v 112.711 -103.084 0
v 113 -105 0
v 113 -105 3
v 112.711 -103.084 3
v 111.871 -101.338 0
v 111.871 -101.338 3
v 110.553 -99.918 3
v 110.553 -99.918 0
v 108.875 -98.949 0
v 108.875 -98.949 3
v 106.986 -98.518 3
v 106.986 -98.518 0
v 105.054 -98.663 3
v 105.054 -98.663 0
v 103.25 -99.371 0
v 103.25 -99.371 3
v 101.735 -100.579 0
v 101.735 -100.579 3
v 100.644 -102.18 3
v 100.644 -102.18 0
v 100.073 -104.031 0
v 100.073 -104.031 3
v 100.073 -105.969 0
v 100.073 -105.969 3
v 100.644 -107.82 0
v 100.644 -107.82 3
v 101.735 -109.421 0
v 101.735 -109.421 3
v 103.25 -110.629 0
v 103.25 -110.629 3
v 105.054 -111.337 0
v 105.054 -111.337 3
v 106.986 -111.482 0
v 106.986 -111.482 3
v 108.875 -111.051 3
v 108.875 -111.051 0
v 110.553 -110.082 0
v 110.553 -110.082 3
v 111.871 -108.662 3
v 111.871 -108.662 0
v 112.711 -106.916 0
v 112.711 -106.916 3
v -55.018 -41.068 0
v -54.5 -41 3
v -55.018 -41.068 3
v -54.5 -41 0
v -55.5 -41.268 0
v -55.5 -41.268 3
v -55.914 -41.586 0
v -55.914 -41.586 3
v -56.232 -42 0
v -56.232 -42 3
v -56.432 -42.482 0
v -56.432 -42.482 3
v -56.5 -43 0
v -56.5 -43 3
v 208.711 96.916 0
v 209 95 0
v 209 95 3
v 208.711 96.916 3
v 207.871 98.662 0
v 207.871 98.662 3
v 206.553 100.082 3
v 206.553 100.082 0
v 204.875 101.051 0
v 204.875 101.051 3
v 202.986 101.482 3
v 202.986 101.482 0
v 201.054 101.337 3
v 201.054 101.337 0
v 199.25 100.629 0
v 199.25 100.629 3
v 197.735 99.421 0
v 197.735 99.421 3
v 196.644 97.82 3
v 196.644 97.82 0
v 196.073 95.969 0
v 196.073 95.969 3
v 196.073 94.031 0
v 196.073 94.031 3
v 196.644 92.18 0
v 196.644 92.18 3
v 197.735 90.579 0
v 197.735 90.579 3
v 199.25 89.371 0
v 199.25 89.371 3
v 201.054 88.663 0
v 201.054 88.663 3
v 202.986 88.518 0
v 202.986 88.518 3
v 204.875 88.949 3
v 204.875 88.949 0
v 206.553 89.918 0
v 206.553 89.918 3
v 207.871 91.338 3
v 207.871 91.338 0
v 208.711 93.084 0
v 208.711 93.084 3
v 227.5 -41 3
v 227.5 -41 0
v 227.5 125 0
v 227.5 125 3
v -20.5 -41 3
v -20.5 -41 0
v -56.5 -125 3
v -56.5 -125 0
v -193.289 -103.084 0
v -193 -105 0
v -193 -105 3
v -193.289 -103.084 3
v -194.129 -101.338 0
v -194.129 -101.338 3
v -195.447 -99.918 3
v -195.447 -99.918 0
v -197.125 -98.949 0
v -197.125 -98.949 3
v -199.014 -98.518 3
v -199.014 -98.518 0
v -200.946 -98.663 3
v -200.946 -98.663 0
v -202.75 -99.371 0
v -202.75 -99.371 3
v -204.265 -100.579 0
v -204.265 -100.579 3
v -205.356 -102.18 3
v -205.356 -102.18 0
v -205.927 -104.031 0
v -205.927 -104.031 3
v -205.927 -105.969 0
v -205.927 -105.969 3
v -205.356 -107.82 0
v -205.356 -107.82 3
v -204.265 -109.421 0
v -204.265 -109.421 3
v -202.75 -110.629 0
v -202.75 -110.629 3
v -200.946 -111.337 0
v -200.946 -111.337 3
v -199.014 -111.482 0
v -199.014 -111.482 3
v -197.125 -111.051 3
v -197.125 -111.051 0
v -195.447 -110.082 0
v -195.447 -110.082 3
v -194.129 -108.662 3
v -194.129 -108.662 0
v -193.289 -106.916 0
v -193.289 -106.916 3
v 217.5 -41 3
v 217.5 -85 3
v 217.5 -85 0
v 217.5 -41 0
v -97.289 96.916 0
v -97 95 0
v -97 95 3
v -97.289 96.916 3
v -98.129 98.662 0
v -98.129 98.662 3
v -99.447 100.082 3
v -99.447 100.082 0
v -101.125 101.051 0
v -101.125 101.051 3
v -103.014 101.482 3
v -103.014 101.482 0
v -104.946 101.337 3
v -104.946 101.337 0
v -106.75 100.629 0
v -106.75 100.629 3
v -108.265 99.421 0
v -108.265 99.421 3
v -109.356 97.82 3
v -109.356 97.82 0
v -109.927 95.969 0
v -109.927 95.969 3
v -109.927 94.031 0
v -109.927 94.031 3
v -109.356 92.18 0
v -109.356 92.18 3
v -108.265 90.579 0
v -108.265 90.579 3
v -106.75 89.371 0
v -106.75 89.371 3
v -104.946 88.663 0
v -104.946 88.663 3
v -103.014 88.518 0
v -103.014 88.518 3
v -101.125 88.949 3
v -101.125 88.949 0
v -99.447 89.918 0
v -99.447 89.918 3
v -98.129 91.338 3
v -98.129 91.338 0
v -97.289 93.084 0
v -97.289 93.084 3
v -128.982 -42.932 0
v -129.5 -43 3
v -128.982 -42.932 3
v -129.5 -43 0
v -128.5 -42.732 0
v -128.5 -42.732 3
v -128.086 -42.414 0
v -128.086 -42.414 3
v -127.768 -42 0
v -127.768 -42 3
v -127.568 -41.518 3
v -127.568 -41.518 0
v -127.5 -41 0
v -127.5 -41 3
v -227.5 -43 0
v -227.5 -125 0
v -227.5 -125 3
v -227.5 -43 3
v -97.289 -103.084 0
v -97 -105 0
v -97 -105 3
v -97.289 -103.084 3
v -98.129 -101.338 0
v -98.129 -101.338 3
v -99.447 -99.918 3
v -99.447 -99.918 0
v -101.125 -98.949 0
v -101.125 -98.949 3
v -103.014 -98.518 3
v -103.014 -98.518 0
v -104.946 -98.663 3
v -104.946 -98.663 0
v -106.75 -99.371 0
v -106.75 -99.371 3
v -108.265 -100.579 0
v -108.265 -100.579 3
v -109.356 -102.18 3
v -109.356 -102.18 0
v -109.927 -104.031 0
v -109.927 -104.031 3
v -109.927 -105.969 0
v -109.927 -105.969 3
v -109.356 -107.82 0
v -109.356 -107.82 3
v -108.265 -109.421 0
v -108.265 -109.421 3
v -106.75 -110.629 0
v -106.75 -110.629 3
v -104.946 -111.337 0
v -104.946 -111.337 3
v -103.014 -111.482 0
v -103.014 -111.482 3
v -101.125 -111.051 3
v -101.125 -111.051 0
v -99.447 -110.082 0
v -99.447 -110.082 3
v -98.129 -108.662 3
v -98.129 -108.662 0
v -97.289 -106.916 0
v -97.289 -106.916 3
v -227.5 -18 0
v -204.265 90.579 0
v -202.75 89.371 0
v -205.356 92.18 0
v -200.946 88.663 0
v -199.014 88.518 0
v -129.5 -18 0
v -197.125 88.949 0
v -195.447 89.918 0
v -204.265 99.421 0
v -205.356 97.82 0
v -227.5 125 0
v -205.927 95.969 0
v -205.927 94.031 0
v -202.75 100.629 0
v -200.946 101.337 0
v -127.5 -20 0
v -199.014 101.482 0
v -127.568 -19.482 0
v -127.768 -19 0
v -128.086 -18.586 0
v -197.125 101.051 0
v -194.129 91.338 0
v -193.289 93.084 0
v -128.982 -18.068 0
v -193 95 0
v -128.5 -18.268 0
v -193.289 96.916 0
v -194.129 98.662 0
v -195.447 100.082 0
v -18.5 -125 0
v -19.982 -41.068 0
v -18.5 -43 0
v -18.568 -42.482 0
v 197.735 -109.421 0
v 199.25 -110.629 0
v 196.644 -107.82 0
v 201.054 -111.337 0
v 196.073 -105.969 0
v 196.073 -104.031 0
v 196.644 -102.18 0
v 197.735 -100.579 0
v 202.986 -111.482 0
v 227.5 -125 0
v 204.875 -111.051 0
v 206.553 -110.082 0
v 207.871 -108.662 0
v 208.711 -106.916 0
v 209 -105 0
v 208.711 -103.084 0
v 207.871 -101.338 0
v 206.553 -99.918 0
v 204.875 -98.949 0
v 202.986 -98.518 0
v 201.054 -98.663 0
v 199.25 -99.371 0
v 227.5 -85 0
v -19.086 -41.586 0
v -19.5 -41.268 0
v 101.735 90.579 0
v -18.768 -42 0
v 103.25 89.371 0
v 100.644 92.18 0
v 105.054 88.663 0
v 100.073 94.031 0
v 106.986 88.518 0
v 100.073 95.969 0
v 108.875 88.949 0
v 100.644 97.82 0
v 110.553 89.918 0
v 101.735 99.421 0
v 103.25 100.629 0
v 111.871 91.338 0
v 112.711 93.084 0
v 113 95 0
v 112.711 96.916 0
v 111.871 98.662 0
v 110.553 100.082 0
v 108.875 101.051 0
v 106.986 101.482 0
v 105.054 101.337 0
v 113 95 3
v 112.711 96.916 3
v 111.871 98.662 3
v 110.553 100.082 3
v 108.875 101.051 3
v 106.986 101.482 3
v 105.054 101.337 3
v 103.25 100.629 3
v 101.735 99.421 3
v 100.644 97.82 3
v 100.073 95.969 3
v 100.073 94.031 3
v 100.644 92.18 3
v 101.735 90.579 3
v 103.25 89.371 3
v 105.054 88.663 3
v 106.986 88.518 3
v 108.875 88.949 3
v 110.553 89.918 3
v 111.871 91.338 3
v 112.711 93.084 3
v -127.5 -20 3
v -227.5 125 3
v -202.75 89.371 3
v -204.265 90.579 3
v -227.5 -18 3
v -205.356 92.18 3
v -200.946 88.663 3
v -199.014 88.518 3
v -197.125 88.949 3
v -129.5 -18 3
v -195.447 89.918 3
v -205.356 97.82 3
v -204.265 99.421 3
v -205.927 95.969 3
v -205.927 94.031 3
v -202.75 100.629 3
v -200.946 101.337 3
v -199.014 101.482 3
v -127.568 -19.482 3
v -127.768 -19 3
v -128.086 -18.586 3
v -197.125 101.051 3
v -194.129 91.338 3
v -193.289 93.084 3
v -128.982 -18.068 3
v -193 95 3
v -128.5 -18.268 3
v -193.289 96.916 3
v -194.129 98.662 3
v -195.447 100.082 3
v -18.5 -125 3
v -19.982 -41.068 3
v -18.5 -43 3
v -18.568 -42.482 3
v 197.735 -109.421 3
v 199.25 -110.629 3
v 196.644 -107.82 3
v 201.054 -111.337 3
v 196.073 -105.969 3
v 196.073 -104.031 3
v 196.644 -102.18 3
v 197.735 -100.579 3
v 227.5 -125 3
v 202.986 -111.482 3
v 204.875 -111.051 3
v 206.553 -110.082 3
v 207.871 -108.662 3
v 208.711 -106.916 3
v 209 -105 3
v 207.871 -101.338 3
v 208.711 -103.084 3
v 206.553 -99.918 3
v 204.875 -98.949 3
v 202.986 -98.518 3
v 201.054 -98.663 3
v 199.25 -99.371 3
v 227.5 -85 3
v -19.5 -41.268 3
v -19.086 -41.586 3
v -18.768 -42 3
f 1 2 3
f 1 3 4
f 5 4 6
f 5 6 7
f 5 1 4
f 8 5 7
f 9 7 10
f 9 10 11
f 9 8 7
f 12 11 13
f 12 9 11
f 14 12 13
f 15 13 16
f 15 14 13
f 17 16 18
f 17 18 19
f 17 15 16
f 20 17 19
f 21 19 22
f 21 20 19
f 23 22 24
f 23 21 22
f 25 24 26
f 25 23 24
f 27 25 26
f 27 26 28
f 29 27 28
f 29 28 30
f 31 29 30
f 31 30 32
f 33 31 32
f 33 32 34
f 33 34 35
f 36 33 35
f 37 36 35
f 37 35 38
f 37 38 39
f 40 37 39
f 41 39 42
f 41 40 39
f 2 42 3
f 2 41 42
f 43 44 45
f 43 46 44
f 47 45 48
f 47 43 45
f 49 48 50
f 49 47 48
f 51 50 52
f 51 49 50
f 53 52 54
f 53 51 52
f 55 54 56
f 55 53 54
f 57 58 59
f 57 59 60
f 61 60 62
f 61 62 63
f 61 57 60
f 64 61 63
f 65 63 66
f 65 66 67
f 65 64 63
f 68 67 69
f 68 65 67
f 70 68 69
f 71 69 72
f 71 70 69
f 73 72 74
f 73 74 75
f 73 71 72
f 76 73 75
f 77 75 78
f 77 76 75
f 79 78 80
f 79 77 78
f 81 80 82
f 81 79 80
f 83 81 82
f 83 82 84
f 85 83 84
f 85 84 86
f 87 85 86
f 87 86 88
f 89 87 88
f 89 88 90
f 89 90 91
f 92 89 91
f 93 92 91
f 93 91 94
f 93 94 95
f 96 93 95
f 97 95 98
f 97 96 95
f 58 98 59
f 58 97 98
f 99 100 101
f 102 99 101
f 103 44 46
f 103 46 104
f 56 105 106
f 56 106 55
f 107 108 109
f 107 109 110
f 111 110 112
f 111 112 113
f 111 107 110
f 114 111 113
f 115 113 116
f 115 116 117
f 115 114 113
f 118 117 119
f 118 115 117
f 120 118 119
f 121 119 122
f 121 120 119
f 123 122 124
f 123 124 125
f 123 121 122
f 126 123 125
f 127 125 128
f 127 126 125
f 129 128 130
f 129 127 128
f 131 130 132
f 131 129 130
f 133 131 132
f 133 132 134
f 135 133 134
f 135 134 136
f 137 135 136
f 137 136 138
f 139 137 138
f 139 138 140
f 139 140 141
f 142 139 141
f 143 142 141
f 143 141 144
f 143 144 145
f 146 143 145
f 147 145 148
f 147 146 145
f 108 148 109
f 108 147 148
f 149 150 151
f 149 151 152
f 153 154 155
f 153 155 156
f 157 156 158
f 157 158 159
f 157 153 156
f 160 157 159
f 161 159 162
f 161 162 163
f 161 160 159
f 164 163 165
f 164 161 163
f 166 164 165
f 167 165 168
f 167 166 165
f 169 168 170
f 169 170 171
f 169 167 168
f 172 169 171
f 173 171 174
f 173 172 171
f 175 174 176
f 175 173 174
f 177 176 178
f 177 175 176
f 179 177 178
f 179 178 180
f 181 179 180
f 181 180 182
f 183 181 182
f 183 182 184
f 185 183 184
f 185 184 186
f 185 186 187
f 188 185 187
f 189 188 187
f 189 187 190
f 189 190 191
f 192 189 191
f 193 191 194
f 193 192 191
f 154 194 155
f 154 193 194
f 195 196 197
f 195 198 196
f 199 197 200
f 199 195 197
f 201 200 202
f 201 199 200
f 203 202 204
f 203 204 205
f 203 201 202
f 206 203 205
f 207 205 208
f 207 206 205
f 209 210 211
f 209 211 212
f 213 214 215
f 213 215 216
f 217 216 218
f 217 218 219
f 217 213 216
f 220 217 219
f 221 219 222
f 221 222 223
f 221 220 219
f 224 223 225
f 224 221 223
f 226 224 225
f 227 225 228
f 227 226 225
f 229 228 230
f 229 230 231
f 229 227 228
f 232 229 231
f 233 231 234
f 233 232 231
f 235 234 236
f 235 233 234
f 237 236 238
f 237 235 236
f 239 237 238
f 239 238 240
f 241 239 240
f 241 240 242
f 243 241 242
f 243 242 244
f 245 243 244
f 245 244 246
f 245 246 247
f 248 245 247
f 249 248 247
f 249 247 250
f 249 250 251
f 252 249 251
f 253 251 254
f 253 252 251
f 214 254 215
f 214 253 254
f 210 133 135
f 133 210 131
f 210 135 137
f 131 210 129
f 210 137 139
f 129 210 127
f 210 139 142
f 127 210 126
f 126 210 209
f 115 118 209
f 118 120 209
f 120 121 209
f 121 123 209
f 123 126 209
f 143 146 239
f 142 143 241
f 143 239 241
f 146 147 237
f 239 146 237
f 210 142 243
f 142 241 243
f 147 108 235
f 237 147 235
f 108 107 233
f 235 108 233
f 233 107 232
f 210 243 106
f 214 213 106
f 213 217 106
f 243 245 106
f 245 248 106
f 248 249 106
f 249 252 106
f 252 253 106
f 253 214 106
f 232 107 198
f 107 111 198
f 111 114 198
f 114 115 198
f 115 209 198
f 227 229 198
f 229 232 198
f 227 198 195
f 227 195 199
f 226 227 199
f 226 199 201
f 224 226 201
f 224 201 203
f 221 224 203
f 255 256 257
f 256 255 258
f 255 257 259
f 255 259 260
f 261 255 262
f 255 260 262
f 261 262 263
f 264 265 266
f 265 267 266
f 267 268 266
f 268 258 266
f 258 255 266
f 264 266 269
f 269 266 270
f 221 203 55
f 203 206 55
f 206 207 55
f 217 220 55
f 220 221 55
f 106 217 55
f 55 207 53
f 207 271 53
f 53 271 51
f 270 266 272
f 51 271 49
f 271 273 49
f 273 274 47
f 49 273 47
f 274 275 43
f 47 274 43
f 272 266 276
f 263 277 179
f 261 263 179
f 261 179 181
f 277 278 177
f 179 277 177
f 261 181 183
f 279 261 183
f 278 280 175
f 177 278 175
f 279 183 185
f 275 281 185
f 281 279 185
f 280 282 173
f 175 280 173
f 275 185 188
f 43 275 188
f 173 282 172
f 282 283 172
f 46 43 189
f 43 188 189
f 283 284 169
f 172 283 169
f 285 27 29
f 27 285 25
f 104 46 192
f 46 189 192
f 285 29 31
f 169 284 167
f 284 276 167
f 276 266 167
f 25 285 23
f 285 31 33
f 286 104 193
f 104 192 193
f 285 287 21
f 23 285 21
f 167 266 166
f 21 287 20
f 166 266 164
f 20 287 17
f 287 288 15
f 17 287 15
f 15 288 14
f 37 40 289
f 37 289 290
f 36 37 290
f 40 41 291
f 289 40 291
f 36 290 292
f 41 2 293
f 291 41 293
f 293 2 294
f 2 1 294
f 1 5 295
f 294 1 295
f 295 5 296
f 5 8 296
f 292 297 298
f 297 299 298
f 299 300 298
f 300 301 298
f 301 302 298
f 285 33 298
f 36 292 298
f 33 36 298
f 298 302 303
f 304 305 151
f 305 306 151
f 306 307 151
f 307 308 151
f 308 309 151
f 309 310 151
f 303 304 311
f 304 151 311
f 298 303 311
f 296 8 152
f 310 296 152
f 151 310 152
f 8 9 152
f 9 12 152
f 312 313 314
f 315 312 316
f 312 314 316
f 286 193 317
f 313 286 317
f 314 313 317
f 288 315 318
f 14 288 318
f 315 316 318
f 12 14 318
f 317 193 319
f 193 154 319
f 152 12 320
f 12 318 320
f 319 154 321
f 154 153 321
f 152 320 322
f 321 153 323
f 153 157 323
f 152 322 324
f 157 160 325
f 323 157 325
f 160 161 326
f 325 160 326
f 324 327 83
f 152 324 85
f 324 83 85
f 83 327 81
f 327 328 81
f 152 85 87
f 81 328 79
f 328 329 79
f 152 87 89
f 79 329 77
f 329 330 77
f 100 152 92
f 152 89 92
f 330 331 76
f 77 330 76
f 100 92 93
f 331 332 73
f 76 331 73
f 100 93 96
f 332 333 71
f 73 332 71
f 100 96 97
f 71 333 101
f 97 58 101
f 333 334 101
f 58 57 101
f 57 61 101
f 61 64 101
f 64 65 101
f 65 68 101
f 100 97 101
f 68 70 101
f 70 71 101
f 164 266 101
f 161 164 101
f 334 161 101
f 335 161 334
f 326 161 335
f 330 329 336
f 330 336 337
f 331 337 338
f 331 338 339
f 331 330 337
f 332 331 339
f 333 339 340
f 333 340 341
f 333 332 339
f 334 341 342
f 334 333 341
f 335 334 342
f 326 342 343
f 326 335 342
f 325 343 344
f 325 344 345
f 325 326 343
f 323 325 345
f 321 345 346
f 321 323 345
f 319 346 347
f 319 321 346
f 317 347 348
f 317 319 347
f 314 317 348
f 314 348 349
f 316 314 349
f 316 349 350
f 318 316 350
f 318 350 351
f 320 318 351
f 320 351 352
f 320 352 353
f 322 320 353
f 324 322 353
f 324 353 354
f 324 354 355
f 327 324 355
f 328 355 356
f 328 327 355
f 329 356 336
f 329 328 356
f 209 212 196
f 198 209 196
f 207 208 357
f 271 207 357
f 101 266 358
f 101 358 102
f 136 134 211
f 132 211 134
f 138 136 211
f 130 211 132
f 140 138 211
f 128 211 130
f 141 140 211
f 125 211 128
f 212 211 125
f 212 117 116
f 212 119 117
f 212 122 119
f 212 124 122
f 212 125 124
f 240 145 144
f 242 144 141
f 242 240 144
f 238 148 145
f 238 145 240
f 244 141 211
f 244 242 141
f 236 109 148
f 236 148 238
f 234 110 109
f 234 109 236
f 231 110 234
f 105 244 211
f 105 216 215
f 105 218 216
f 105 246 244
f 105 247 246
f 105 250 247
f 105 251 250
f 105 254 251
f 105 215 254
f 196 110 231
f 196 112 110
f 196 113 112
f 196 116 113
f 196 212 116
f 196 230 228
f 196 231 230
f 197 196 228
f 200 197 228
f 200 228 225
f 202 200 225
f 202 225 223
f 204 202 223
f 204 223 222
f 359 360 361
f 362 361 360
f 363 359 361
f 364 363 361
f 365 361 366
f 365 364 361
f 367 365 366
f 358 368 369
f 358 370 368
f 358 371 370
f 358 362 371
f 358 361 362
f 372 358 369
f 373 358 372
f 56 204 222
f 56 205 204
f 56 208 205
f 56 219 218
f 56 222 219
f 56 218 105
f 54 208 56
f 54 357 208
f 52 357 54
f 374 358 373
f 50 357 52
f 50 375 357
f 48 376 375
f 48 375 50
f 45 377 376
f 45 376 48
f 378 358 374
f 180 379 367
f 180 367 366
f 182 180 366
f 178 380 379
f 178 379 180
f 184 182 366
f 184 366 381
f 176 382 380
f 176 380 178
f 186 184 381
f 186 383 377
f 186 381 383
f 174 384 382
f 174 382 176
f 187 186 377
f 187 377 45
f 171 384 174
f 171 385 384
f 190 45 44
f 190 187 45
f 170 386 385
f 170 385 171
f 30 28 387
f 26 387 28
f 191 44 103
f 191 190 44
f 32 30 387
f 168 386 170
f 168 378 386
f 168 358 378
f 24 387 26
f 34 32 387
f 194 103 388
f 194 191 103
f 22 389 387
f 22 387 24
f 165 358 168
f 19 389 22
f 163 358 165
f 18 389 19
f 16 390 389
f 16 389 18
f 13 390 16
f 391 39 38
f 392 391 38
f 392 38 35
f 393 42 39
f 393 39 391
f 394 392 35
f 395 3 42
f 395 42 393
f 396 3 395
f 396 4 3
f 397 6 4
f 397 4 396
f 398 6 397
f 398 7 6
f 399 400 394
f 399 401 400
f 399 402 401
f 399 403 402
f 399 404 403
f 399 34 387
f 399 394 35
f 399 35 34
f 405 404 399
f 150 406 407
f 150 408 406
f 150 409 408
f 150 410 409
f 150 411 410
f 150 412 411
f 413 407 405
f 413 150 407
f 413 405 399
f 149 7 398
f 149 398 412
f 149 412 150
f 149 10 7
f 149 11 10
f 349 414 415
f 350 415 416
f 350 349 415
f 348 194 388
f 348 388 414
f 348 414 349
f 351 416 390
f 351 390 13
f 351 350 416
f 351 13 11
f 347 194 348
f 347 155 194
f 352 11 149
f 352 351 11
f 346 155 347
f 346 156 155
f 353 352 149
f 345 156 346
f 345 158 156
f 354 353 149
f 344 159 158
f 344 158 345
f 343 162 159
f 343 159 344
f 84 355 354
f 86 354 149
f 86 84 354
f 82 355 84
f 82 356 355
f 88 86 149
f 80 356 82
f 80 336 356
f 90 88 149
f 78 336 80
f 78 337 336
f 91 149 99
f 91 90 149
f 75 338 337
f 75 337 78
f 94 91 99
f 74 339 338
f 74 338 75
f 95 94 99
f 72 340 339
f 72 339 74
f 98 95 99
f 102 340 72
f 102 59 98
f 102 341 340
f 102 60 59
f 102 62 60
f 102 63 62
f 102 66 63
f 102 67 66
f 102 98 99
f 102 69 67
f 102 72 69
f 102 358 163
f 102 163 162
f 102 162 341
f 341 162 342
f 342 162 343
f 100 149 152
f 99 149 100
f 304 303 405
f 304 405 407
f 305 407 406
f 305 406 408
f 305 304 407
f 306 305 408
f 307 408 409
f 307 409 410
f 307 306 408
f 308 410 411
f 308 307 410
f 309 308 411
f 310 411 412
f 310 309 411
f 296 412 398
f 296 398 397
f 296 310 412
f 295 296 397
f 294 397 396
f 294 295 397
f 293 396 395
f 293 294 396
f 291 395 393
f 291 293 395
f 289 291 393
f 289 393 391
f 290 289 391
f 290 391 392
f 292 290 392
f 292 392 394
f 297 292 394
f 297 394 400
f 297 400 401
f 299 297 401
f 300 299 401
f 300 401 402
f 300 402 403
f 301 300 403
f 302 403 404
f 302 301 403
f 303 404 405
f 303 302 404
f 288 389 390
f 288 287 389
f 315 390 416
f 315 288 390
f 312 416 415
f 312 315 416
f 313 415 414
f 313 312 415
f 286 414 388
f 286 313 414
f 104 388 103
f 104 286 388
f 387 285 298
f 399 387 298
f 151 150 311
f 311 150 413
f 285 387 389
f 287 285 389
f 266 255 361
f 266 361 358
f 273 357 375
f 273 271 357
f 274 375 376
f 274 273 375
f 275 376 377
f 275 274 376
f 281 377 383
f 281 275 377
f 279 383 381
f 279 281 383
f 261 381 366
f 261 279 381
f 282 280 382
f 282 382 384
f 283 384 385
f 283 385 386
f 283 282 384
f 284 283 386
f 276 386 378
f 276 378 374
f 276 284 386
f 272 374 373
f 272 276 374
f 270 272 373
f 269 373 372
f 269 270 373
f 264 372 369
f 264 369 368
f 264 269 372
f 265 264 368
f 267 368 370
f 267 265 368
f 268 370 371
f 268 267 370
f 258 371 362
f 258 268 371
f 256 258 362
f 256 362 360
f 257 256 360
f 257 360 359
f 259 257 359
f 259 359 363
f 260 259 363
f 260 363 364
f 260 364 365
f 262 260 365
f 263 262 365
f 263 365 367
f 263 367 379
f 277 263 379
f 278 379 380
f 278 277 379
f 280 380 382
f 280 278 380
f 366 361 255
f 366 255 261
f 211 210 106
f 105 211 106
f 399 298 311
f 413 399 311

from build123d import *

# Parameters (mm, degrees)
ESQUISSE1_W             = 455
ESQUISSE1_H             = 250
ESQUISSE1_R             = 6.5
BOSS_EXTRU_1_DEPTH      = 3
ESQUISSE4_W             = 100
ESQUISSE4_H             = 25
ESQUISSE4_W_2           = 38
ESQUISSE4_H_2           = 84
ESQUISSE4_W_3           = 10
ESQUISSE4_H_3           = 44
ENL_V_MAT_EXTRU_3_DEPTH = 10
CONG_1_R                = 2


with BuildPart() as part:
    # Esquisse1 → Boss.-Extru.1 (new body)
    with BuildSketch(Plane.XY):
        Rectangle(ESQUISSE1_W, ESQUISSE1_H)
        with Locations((106.5, 95)):
            Circle(ESQUISSE1_R, mode=Mode.SUBTRACT)
        with Locations((202.5, 95)):
            Circle(ESQUISSE1_R, mode=Mode.SUBTRACT)
        with Locations((106.5, -105)):
            Circle(ESQUISSE1_R, mode=Mode.SUBTRACT)
        with Locations((202.5, -105)):
            Circle(ESQUISSE1_R, mode=Mode.SUBTRACT)
        with Locations((-103.5, -105)):
            Circle(ESQUISSE1_R, mode=Mode.SUBTRACT)
        with Locations((-103.5, 95)):
            Circle(ESQUISSE1_R, mode=Mode.SUBTRACT)
        with Locations((-199.5, 95)):
            Circle(ESQUISSE1_R, mode=Mode.SUBTRACT)
        with Locations((-199.5, -105)):
            Circle(ESQUISSE1_R, mode=Mode.SUBTRACT)
    extrude(amount=BOSS_EXTRU_1_DEPTH)

    # Esquisse4 → Enlèv. mat.-Extru.3 (cut)
    with BuildSketch(Plane.XY.offset(3)):
        with Locations((-177.5, -30.5)):
            Rectangle(ESQUISSE4_W, ESQUISSE4_H)
        with Locations((-37.5, -83)):
            Rectangle(ESQUISSE4_W_2, ESQUISSE4_H_2)
        with Locations((222.5, -63)):
            Rectangle(ESQUISSE4_W_3, ESQUISSE4_H_3)
    extrude(amount=-ENL_V_MAT_EXTRU_3_DEPTH, mode=Mode.SUBTRACT)

    # Congé1
    cong_1_edges = [part.edges().sort_by_distance(p)[0] for p in [
        (-127.5, -18, 1.5),
        (-127.5, -43, 1.5),
        (-56.5, -41, 1.5),
        (-18.5, -41, 1.5),
    ]]
    fillet(cong_1_edges, radius=CONG_1_R)


solid = part.part
